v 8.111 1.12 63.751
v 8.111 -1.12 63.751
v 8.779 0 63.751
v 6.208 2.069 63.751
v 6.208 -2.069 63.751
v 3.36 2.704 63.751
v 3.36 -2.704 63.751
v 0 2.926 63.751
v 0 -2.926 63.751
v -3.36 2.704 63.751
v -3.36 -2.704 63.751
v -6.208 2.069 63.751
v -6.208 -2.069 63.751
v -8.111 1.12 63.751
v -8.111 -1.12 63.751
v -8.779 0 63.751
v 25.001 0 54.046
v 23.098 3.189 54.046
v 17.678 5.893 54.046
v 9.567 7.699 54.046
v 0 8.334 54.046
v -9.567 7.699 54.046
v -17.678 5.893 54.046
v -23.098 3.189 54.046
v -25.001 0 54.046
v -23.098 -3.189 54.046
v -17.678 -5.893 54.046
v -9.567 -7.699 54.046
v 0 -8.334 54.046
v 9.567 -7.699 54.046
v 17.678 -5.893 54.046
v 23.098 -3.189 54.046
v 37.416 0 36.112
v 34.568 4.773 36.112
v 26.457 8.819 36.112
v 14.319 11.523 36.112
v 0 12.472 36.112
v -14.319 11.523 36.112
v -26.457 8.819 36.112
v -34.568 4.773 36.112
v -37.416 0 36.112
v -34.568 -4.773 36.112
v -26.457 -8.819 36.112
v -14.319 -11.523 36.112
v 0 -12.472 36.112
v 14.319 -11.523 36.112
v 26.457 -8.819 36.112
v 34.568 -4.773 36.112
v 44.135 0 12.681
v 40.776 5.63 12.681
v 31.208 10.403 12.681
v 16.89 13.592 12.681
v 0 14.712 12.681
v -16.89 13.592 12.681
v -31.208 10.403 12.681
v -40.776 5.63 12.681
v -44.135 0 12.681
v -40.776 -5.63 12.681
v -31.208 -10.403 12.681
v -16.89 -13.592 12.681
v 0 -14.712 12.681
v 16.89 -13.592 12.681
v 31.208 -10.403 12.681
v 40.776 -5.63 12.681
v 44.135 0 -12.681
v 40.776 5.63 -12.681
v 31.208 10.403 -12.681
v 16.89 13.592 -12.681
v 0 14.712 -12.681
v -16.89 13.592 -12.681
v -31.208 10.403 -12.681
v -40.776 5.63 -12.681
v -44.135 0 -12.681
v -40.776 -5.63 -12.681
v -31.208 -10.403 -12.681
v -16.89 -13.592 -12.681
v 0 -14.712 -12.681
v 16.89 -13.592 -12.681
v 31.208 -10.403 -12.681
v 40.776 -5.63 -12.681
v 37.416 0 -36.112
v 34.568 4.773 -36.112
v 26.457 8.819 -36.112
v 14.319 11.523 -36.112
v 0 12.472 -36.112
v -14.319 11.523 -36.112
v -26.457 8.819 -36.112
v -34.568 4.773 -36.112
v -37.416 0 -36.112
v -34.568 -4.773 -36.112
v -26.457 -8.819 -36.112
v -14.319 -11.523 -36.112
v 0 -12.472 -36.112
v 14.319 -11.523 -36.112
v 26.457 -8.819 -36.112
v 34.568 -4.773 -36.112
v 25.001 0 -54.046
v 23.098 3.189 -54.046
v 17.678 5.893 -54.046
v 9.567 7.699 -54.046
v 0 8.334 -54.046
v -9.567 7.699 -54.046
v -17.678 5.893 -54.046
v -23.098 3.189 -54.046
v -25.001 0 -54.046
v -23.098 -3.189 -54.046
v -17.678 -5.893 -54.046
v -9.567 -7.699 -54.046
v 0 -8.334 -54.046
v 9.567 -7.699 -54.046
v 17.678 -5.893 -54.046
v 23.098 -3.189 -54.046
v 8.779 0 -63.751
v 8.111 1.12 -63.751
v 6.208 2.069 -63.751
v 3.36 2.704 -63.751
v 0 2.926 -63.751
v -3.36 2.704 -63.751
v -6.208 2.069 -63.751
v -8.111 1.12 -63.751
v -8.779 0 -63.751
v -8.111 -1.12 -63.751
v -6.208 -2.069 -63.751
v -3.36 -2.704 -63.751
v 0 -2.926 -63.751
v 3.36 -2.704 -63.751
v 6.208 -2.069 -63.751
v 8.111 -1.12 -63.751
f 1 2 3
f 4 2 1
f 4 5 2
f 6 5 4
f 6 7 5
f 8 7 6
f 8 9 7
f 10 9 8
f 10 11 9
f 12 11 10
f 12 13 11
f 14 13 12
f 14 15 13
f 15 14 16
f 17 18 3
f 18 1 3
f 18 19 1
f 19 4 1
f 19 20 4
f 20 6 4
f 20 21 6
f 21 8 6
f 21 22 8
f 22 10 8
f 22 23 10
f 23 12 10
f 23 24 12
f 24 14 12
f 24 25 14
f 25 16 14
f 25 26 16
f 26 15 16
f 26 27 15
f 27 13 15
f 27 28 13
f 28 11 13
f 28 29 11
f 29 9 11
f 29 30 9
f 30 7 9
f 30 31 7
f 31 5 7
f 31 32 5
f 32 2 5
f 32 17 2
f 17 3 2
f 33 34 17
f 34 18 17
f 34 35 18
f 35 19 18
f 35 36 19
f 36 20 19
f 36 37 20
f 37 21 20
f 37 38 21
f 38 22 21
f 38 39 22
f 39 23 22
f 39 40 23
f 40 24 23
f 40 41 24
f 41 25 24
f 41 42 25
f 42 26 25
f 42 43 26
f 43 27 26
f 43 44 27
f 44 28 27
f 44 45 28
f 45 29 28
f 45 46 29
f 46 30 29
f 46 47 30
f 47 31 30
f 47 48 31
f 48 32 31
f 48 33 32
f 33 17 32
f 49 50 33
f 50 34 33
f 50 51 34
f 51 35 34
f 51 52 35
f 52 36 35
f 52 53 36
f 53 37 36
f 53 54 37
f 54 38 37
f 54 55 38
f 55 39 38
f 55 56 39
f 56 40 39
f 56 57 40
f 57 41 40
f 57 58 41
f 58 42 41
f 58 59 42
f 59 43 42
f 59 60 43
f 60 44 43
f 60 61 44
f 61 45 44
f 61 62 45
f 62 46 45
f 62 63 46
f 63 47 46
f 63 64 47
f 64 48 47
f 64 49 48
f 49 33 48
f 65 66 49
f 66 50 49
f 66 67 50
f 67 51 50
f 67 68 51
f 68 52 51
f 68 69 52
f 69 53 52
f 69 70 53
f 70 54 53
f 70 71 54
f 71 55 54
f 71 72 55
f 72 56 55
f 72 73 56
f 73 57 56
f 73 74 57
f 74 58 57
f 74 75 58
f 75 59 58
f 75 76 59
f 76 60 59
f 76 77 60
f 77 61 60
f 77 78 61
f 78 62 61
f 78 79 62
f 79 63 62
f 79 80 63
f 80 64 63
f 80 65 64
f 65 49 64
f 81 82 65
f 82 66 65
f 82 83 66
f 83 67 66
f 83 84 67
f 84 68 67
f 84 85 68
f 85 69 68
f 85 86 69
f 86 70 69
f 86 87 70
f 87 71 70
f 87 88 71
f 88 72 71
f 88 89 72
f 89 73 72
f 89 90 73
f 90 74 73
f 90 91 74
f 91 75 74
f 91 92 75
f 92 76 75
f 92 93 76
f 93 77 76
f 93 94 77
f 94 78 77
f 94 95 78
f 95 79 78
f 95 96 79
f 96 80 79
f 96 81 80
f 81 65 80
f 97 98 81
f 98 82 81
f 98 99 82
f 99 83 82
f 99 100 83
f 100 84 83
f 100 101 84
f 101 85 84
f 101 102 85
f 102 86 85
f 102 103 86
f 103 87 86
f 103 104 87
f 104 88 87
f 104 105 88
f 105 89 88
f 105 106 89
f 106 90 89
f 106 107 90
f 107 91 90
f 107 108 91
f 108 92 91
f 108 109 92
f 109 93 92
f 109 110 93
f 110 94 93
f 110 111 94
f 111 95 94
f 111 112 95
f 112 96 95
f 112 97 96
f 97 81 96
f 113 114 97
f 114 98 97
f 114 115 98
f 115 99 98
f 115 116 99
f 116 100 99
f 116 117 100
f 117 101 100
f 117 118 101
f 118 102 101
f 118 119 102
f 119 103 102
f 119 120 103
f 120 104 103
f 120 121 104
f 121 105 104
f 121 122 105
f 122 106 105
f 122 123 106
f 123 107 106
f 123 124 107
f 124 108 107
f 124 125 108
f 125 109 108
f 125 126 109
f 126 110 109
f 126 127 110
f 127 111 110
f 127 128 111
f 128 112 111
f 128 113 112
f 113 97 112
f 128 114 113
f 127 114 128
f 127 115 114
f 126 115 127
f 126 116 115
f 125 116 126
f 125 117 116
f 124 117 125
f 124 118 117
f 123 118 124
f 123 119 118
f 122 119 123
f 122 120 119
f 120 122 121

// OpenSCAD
// Generated by SolidPython 1.0.1 on 2020-07-29 00:46:48


scale(v = [9, 3, 13]) {
	sphere(r = 5);
}
/***********************************************
*********      SolidPython code:      **********
************************************************
 
# import packages: SolidPython
from solid import *
from solid.utils import *
from itertools import chain, combinations, permutations


class Resize:

    def __init__(self, scad_file):
        self.scad_file = scad_file
        #self.scad_file = import_scad(scad_file)
        # cone/cylinder param:
        self.r1 = 0
        self.r2 = 0
        self.h = 0
        # rectangular prism param:
        self.w = 0
        self.l = 0
        # ellipse param:
        self.r = 0

    # import OpenScad code (file name corresponds to shape)


    # classify shape + parameters
    def assign(self, param1, param2, param3):
        if self.scad_file == 'cone.scad':
            self.r1 = param1
            self.r2 = param2
            self.h = param3
        elif self.scad_file == 'cylinder.scad':
            self.r1 = param1
            self.r2 = param2
            self.h = param3
        elif self.scad_file == 'rectangularPrism.scad':
            self.h = param1
            self.l = param2
            self.w = param3
        else:
            self.r = param1
            self.h = param2

    # resize parameters
    def iterate(self):
        x = range(3, 20, 2)
        i = 1
        if self.scad_file == 'cone.scad':
            tempList = list(permutations(x, 2))
            for temp in tempList:
                param1 = temp[0]
                param2 = temp[1]
                filepath = 'produced_scad_files/' + 'cone' + str(param1) + '_' + str(param2) + '_' + '.scad'
                scad_render_to_file(cylinder(h=param1, r1=param2, r2=0), filepath)

        elif self.scad_file == 'cylinder.scad':
            tempList = list(permutations(x, 3))
            for temp in tempList:
                param1 = temp[0]
                param2 = temp[1]
                filepath = 'produced_scad_files/' + 'cylinder' + str(param1) + '_' + str(param2) + '_' + '.scad'
                scad_render_to_file(cylinder(h=param1, r1=param2, r2=param2), filepath)

        elif self.scad_file == 'rectangularPrism.scad':
            tempList = list(permutations(x, 3))
            for temp in tempList:
                param1 = temp[0]
                param2 = temp[1]
                param3 = temp[2]
                filepath = 'produced_scad_files/' + 'rectangularPrism' + str(param1) + '_' + str(param2) + '_' + str(
                    param3) + '.scad'
                scad_render_to_file(cube(size=(param1, param2, param3)), filepath)

        elif self.scad_file == 'ellipse.scad':
            tempList = list(permutations(x, 4))
            for temp in tempList:
                param1 = temp[0]
                param2 = temp[1]
                param3 = temp[2]
                param4 = temp[3]
                filepath = 'produced_scad_files/' + 'ellipse' + str(param1) + '_' + str(param2) + '_' + str(param3) + '_' + str(param4) + '.scad'
                scad_render_to_file(scale([param1, param2, param3])(sphere(r=param4)), filepath)

    def render_to_scadfile(self):
        scad_render_to_file(scad, 'example.scad') 
 
************************************************/
